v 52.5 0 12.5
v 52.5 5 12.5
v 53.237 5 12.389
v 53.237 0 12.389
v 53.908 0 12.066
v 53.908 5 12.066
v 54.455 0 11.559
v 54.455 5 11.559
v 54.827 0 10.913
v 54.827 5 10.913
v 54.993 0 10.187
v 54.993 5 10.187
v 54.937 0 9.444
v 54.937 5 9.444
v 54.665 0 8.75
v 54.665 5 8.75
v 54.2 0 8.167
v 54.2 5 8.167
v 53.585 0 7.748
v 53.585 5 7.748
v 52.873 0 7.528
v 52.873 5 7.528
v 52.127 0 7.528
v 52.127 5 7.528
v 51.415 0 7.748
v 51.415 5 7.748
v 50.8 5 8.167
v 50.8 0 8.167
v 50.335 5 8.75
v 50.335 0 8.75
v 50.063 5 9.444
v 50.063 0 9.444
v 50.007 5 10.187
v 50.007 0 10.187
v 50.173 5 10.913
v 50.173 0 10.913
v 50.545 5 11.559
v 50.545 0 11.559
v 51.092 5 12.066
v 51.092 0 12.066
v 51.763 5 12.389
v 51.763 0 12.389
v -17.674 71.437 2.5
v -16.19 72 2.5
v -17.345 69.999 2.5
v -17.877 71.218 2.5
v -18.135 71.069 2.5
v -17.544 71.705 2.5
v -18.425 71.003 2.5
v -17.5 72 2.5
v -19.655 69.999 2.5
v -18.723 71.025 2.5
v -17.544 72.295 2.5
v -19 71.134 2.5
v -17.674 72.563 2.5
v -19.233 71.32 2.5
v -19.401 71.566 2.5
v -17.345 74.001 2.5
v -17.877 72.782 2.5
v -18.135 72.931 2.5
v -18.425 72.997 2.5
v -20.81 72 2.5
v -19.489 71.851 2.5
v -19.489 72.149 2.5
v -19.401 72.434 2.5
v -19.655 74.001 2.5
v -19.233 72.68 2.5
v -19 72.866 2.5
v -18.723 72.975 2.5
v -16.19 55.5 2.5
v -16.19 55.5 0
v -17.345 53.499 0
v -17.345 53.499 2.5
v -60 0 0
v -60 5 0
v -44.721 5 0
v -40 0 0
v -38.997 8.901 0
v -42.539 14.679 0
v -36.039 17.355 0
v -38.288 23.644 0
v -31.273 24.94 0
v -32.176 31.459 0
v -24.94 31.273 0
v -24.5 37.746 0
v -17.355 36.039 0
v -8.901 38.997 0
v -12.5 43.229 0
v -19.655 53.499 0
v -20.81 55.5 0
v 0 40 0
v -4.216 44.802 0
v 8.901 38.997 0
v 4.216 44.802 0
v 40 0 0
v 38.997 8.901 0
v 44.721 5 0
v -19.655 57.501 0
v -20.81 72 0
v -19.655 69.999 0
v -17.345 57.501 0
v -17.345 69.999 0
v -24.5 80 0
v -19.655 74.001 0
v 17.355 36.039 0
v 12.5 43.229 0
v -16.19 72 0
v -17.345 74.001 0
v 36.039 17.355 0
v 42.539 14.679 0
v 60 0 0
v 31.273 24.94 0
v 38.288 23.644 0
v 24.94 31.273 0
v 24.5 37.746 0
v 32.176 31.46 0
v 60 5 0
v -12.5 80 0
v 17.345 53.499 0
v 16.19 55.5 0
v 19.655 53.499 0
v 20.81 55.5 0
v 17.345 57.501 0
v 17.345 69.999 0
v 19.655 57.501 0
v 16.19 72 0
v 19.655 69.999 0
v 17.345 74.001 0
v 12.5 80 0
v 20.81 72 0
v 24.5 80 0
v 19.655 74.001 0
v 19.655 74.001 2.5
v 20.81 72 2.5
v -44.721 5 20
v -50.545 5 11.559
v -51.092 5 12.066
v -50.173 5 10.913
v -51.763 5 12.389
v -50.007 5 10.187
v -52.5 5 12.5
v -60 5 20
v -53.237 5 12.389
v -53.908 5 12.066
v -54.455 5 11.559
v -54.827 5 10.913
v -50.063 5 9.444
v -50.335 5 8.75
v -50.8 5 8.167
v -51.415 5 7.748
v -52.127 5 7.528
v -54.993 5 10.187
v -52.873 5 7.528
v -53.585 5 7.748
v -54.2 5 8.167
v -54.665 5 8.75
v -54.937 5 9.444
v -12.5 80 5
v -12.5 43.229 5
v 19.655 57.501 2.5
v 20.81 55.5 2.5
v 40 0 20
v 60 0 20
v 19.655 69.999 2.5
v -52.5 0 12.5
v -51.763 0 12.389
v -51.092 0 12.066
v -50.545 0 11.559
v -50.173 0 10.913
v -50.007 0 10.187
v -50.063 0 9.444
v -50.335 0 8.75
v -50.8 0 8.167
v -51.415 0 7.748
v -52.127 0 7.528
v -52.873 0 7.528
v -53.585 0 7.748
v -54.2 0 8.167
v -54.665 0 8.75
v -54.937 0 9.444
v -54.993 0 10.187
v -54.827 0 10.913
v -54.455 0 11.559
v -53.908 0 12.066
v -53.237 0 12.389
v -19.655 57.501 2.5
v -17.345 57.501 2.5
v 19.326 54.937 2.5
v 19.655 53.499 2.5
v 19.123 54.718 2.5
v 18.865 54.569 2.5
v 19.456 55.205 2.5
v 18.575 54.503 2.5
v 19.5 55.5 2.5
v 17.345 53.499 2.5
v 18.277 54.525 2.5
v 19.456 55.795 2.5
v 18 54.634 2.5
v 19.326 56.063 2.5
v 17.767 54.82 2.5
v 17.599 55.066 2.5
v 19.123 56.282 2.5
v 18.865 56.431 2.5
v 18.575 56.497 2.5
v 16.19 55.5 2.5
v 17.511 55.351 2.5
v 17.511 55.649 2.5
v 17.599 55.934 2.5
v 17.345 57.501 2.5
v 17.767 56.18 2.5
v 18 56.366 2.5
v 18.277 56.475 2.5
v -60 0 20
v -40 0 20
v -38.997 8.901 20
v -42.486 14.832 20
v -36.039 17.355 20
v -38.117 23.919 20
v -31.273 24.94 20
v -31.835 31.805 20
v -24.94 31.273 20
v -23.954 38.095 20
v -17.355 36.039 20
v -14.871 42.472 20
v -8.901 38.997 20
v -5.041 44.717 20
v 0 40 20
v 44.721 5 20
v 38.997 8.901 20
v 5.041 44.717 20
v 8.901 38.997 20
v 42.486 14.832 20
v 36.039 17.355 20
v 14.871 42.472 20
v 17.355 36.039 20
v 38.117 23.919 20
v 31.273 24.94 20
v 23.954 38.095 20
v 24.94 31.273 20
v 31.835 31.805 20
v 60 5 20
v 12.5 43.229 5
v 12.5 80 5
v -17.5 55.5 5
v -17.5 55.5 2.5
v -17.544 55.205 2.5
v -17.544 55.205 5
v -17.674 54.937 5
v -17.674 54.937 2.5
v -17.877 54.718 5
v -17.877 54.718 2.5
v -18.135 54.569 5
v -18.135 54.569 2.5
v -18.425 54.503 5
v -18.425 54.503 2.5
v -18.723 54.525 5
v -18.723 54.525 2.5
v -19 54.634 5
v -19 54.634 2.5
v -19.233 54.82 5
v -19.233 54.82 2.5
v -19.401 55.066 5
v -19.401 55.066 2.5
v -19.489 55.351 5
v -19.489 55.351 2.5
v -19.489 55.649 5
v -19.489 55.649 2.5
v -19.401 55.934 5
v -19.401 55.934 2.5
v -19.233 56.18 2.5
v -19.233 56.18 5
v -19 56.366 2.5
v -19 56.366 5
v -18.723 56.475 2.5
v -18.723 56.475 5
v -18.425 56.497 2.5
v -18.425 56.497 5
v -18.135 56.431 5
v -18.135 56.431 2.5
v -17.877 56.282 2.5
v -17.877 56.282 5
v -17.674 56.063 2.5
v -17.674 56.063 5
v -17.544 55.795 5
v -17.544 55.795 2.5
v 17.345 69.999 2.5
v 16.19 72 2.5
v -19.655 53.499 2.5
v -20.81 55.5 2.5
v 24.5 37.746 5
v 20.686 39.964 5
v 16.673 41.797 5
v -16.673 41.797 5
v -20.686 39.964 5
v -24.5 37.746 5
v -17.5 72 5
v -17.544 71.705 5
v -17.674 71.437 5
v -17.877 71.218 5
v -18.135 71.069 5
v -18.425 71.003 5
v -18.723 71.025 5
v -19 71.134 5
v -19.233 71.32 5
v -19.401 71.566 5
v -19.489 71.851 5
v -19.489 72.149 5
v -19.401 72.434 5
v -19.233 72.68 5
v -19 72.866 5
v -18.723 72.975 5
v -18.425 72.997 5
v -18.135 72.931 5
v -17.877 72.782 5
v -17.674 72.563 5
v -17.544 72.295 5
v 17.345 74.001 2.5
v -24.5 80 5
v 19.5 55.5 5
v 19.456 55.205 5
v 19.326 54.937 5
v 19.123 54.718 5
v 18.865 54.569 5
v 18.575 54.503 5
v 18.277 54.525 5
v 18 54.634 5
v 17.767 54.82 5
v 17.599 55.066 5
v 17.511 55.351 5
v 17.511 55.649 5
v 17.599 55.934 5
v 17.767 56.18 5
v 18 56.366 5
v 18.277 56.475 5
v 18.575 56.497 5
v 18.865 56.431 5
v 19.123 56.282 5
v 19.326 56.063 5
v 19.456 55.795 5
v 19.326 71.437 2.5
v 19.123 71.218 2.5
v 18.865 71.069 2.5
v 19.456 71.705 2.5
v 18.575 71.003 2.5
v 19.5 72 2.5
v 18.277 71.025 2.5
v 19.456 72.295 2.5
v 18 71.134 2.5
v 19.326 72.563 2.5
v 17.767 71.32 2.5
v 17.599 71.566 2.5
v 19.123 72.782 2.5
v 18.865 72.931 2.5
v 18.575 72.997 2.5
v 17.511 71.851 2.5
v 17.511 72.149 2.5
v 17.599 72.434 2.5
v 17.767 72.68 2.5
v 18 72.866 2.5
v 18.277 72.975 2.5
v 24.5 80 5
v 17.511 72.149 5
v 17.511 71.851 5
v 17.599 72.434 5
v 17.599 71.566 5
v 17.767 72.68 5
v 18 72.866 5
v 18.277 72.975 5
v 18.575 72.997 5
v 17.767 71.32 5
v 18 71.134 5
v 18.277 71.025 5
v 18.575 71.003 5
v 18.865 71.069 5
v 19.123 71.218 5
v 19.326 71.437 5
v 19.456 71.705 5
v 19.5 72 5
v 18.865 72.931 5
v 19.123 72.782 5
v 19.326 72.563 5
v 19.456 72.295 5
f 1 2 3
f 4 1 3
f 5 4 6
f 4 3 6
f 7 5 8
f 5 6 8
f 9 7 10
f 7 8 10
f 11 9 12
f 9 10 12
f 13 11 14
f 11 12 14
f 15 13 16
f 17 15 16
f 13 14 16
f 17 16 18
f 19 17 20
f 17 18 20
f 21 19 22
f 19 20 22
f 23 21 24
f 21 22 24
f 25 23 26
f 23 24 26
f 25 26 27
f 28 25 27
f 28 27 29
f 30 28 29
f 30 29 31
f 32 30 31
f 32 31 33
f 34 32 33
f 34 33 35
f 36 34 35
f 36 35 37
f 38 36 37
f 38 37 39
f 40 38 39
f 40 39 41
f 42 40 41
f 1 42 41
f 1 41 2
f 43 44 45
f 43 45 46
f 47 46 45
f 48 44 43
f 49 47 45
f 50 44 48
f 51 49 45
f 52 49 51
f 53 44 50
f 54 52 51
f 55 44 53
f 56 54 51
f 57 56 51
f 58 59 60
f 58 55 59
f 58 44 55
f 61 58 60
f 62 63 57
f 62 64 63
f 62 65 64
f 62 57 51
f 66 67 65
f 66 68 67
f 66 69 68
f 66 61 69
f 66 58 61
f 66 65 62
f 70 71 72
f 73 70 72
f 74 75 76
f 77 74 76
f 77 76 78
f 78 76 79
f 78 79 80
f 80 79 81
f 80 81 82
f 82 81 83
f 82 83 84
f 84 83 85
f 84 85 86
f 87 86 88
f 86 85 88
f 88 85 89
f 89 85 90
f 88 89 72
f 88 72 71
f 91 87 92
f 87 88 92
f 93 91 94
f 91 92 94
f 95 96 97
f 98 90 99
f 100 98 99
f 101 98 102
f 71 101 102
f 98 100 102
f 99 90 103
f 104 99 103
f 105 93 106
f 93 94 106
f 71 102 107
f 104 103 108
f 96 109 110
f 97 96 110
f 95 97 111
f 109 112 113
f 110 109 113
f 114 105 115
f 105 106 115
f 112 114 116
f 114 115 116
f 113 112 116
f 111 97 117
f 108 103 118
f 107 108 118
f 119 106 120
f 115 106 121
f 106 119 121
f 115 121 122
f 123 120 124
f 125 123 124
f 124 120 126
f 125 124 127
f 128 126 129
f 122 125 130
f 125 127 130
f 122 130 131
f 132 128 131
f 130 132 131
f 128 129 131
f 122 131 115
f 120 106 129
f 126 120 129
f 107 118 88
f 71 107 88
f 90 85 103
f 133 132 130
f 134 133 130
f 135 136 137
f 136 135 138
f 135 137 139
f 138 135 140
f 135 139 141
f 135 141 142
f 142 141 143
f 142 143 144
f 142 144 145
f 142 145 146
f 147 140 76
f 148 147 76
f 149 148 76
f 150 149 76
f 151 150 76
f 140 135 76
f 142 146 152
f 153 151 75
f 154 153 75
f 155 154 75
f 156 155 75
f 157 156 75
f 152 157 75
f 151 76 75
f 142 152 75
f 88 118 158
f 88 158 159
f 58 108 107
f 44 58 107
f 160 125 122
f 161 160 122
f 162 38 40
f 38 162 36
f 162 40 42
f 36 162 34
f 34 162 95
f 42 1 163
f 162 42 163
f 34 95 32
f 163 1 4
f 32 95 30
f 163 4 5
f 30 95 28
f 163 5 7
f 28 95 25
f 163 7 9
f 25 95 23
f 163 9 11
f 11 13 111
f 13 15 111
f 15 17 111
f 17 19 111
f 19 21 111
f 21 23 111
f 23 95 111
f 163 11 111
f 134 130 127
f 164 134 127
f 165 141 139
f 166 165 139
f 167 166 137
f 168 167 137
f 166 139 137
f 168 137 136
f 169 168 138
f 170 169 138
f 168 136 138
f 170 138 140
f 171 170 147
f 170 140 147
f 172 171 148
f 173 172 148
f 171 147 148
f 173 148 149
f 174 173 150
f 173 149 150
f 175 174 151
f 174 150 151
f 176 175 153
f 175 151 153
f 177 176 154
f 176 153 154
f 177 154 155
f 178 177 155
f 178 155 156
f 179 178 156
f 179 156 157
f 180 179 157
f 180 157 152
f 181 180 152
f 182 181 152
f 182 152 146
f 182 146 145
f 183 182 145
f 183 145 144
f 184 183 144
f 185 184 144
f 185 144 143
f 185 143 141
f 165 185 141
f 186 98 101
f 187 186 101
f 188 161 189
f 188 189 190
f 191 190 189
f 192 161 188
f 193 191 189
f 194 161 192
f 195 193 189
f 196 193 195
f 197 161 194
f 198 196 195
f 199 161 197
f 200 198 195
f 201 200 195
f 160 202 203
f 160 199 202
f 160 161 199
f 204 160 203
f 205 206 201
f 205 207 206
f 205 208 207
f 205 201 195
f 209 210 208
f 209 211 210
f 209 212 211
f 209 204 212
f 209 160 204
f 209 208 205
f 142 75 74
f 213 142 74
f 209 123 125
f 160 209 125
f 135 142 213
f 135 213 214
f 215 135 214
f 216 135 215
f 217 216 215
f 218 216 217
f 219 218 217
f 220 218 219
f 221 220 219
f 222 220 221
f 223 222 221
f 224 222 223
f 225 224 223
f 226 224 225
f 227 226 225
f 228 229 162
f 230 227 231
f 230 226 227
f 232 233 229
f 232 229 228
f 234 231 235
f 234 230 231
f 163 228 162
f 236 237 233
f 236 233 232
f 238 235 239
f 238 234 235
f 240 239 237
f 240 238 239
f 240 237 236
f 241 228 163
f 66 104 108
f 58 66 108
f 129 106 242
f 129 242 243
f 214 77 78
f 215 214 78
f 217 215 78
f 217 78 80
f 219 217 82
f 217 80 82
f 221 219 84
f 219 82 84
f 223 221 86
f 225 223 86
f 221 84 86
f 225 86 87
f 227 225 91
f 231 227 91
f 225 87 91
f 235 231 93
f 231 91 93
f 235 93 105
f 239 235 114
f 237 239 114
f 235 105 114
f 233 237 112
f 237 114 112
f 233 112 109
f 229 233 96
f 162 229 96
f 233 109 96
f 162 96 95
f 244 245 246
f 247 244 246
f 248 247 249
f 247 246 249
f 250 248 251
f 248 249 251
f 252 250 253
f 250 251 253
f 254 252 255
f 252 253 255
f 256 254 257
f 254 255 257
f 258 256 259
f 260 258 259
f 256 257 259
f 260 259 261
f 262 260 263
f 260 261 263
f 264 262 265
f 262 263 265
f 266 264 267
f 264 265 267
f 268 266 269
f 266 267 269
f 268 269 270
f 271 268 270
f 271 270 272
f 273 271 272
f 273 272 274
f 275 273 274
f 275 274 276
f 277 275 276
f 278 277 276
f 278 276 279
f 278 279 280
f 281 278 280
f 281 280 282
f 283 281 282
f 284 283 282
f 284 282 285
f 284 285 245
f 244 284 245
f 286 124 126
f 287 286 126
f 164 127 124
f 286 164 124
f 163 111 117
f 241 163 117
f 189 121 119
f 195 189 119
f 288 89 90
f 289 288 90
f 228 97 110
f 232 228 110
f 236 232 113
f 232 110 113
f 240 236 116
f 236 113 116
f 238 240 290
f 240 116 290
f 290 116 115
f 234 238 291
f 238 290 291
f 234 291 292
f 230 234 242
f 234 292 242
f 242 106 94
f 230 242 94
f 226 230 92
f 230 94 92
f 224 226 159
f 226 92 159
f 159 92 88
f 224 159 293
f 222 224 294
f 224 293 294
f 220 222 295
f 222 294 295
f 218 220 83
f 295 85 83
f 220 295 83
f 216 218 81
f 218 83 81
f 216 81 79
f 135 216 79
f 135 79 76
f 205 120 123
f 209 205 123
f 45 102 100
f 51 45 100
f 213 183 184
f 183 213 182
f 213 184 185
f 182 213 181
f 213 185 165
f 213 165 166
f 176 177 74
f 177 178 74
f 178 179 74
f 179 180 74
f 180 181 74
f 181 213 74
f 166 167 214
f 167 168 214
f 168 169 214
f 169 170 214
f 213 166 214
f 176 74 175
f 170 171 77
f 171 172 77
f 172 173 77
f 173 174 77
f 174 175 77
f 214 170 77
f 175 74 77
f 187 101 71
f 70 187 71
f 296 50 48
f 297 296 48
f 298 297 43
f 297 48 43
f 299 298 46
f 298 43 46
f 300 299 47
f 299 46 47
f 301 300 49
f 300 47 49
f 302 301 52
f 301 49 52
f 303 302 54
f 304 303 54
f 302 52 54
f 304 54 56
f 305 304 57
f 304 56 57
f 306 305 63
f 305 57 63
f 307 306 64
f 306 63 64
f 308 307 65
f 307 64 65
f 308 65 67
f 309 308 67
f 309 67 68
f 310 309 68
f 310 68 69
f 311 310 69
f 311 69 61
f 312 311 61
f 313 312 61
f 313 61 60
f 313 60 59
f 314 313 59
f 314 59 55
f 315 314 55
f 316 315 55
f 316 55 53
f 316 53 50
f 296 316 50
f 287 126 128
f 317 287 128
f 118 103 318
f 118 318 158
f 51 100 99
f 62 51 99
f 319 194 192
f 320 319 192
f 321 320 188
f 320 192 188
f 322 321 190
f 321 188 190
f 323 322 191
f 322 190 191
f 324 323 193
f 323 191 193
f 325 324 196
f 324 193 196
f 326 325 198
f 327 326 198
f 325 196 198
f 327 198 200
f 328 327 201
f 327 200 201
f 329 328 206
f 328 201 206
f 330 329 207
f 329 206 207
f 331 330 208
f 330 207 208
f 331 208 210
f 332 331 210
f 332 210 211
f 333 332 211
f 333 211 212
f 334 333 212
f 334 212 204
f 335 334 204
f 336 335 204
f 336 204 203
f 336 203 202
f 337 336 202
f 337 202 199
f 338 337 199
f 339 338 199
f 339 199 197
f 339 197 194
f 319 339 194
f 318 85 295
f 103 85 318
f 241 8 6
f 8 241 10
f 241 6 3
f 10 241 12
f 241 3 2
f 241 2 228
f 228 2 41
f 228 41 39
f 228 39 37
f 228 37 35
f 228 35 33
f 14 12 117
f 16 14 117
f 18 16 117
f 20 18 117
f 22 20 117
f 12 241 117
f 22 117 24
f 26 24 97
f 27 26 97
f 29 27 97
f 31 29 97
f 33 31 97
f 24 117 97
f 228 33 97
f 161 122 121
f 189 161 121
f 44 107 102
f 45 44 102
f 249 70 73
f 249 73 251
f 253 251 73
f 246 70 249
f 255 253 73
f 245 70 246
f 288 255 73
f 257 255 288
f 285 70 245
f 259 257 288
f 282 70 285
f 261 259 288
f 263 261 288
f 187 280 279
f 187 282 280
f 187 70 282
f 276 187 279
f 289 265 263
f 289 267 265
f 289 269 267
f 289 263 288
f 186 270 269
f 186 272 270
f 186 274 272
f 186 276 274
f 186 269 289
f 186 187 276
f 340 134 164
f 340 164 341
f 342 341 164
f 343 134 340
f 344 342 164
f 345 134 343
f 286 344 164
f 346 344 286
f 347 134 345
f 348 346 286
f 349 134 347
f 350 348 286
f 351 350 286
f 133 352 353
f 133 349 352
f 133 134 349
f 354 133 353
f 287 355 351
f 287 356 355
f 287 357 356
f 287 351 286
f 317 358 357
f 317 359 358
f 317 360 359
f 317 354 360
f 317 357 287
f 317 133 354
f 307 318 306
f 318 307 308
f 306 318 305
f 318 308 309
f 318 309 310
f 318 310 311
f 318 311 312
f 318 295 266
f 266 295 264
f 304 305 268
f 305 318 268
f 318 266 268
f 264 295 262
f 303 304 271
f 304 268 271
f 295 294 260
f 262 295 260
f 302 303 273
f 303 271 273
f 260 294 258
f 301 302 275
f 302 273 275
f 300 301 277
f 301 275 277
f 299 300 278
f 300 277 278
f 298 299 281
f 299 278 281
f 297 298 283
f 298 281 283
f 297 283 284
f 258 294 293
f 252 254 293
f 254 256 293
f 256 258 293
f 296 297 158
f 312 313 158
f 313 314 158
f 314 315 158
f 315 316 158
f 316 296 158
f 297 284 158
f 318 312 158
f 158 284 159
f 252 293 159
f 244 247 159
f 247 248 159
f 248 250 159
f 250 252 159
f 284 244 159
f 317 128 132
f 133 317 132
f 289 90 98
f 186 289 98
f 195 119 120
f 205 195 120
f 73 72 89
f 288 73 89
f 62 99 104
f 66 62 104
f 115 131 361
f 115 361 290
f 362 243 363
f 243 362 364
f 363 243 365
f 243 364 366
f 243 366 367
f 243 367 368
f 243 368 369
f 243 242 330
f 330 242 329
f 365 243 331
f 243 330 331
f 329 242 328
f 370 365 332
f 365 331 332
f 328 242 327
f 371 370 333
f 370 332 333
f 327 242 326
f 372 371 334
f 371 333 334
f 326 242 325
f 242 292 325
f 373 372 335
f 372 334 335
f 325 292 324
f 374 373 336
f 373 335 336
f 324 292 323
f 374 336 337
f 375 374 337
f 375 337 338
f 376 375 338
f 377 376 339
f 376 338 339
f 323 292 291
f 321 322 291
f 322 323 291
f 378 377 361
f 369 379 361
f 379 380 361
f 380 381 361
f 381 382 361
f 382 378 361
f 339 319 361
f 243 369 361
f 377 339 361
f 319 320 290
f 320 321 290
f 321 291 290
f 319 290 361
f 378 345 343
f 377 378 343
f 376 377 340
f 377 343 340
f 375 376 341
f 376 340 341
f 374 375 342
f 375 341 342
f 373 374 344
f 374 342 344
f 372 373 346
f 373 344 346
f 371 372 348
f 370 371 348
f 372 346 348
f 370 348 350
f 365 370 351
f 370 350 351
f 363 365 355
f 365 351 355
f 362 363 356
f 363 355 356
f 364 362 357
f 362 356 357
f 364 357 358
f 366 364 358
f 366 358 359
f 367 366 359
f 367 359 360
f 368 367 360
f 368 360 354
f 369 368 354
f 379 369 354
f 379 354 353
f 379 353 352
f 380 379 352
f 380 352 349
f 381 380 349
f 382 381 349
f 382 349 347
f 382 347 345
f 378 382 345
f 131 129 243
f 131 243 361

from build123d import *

# Parameters (mm, degrees)
BOSS_EXTRUDE1_DEPTH = 20
F_3DSKETCH3_R       = 1
BOSS_EXTRUDE2_DEPTH = 5
CUT_EXTRUDE1_DEPTH  = 2.5
SKETCH3_R           = 2.5
CUT_EXTRUDE2_DEPTH  = 99.107084352


with BuildPart() as part:
    # Sketch1 → Boss-Extrude1 (new body)
    with BuildSketch(Plane.XY):
        with BuildLine():
            Line((-45, 0), (-40, 0))
            ThreePointArc((-40, 0), (0, 40), (40, 0))
            Line((40, 0), (45, 0))
            Line((45, 0), (60, 0))
            Line((60, 0), (60, 5))
            Line((60, 5), (44.72135955, 5))
            ThreePointArc((44.72135955, 5), (0, 45), (-44.72135955, 5))
            Line((-44.72135955, 5), (-60, 5))
            Line((-60, 5), (-60, 0))
            Line((-60, 0), (-45, 0))
        make_face()
    extrude(amount=BOSS_EXTRUDE1_DEPTH)

    # 3DSketch3 → Boss-Extrude2 (add)
    with BuildSketch(Plane(origin=(-24.5, 37.7458607, 0), x_dir=(0.7573108303632157, 0.6530545966568009, 0), z_dir=(0, 0, -1))):
        with BuildLine():
            Line((0, 0), (27.594259898, -31.999517319))
            Line((27.594259898, -31.999517319), (36.681989862, -24.16286216))
            Line((36.681989862, -24.16286216), (12.668546171, 3.684183209))
            ThreePointArc((12.668546171, 3.684183209), (6.470025326, 1.375289757), (0, 0))
        make_face()
        with Locations(Location((26.913688106, -22.022703097, 0), (0, 0, 40.772303251))):
            Circle(F_3DSKETCH3_R, mode=Mode.SUBTRACT)
        with Locations(Location((16.138287262, -9.527074396, 0), (0, 0, 40.772303251))):
            Circle(F_3DSKETCH3_R, mode=Mode.SUBTRACT)
        with BuildLine():
            Line((31.60131693, 20.010548126), (55.614760621, -7.836497243))
            Line((55.614760621, -7.836497243), (64.702307458, 0))
            Line((64.702307458, 0), (37.10815006, 31.999398456))
            ThreePointArc((37.10815006, 31.999398456), (34.796480727, 25.802065738), (31.60131693, 20.010548126))
        make_face()
        with Locations(Location((54.93418883, 2.14031698, 0), (0, 0, 40.772303251))):
            Circle(F_3DSKETCH3_R, mode=Mode.SUBTRACT)
        with Locations(Location((44.158787985, 14.635945681, 0), (0, 0, 40.772303251))):
            Circle(F_3DSKETCH3_R, mode=Mode.SUBTRACT)
    extrude(amount=-BOSS_EXTRUDE2_DEPTH)

    # Sketch2 → Cut-Extrude1 (cut)
    with BuildSketch(Plane(origin=(0, 0, 0), x_dir=(-1, 0, 0), z_dir=(0, 0, -1))):
        Polygon((-16.19, 55.5), (-17.345, 57.500518683), (-19.655, 57.500518683), (-20.81, 55.5), (-19.655, 53.499481317), (-17.345, 53.499481317), align=None)
        Polygon((-16.19, 72), (-17.345, 74.000518683), (-19.655, 74.000518683), (-20.81, 72), (-19.655, 69.999481317), (-17.345, 69.999481317), align=None)
        Polygon((20.81, 72), (19.655, 74.000518683), (17.345, 74.000518683), (16.19, 72), (17.345, 69.999481317), (19.655, 69.999481317), align=None)
        Polygon((20.81, 55.5), (19.655, 57.500518683), (17.345, 57.500518683), (16.19, 55.5), (17.345, 53.499481317), (19.655, 53.499481317), align=None)
    extrude(amount=-CUT_EXTRUDE1_DEPTH, mode=Mode.SUBTRACT)

    # Sketch3 → Cut-Extrude2 (cut, through all)
    with BuildSketch(Plane(origin=(0, 5, 0), x_dir=(1, 0, 0), z_dir=(0, 1, 0))):
        with Locations(Location((-52.5, -10, 0), (0, 0, 270))):
            Circle(SKETCH3_R)
        with Locations(Location((52.5, -10, 0), (0, 0, 270))):
            Circle(SKETCH3_R)
    extrude(amount=-CUT_EXTRUDE2_DEPTH, mode=Mode.SUBTRACT)


solid = part.part
